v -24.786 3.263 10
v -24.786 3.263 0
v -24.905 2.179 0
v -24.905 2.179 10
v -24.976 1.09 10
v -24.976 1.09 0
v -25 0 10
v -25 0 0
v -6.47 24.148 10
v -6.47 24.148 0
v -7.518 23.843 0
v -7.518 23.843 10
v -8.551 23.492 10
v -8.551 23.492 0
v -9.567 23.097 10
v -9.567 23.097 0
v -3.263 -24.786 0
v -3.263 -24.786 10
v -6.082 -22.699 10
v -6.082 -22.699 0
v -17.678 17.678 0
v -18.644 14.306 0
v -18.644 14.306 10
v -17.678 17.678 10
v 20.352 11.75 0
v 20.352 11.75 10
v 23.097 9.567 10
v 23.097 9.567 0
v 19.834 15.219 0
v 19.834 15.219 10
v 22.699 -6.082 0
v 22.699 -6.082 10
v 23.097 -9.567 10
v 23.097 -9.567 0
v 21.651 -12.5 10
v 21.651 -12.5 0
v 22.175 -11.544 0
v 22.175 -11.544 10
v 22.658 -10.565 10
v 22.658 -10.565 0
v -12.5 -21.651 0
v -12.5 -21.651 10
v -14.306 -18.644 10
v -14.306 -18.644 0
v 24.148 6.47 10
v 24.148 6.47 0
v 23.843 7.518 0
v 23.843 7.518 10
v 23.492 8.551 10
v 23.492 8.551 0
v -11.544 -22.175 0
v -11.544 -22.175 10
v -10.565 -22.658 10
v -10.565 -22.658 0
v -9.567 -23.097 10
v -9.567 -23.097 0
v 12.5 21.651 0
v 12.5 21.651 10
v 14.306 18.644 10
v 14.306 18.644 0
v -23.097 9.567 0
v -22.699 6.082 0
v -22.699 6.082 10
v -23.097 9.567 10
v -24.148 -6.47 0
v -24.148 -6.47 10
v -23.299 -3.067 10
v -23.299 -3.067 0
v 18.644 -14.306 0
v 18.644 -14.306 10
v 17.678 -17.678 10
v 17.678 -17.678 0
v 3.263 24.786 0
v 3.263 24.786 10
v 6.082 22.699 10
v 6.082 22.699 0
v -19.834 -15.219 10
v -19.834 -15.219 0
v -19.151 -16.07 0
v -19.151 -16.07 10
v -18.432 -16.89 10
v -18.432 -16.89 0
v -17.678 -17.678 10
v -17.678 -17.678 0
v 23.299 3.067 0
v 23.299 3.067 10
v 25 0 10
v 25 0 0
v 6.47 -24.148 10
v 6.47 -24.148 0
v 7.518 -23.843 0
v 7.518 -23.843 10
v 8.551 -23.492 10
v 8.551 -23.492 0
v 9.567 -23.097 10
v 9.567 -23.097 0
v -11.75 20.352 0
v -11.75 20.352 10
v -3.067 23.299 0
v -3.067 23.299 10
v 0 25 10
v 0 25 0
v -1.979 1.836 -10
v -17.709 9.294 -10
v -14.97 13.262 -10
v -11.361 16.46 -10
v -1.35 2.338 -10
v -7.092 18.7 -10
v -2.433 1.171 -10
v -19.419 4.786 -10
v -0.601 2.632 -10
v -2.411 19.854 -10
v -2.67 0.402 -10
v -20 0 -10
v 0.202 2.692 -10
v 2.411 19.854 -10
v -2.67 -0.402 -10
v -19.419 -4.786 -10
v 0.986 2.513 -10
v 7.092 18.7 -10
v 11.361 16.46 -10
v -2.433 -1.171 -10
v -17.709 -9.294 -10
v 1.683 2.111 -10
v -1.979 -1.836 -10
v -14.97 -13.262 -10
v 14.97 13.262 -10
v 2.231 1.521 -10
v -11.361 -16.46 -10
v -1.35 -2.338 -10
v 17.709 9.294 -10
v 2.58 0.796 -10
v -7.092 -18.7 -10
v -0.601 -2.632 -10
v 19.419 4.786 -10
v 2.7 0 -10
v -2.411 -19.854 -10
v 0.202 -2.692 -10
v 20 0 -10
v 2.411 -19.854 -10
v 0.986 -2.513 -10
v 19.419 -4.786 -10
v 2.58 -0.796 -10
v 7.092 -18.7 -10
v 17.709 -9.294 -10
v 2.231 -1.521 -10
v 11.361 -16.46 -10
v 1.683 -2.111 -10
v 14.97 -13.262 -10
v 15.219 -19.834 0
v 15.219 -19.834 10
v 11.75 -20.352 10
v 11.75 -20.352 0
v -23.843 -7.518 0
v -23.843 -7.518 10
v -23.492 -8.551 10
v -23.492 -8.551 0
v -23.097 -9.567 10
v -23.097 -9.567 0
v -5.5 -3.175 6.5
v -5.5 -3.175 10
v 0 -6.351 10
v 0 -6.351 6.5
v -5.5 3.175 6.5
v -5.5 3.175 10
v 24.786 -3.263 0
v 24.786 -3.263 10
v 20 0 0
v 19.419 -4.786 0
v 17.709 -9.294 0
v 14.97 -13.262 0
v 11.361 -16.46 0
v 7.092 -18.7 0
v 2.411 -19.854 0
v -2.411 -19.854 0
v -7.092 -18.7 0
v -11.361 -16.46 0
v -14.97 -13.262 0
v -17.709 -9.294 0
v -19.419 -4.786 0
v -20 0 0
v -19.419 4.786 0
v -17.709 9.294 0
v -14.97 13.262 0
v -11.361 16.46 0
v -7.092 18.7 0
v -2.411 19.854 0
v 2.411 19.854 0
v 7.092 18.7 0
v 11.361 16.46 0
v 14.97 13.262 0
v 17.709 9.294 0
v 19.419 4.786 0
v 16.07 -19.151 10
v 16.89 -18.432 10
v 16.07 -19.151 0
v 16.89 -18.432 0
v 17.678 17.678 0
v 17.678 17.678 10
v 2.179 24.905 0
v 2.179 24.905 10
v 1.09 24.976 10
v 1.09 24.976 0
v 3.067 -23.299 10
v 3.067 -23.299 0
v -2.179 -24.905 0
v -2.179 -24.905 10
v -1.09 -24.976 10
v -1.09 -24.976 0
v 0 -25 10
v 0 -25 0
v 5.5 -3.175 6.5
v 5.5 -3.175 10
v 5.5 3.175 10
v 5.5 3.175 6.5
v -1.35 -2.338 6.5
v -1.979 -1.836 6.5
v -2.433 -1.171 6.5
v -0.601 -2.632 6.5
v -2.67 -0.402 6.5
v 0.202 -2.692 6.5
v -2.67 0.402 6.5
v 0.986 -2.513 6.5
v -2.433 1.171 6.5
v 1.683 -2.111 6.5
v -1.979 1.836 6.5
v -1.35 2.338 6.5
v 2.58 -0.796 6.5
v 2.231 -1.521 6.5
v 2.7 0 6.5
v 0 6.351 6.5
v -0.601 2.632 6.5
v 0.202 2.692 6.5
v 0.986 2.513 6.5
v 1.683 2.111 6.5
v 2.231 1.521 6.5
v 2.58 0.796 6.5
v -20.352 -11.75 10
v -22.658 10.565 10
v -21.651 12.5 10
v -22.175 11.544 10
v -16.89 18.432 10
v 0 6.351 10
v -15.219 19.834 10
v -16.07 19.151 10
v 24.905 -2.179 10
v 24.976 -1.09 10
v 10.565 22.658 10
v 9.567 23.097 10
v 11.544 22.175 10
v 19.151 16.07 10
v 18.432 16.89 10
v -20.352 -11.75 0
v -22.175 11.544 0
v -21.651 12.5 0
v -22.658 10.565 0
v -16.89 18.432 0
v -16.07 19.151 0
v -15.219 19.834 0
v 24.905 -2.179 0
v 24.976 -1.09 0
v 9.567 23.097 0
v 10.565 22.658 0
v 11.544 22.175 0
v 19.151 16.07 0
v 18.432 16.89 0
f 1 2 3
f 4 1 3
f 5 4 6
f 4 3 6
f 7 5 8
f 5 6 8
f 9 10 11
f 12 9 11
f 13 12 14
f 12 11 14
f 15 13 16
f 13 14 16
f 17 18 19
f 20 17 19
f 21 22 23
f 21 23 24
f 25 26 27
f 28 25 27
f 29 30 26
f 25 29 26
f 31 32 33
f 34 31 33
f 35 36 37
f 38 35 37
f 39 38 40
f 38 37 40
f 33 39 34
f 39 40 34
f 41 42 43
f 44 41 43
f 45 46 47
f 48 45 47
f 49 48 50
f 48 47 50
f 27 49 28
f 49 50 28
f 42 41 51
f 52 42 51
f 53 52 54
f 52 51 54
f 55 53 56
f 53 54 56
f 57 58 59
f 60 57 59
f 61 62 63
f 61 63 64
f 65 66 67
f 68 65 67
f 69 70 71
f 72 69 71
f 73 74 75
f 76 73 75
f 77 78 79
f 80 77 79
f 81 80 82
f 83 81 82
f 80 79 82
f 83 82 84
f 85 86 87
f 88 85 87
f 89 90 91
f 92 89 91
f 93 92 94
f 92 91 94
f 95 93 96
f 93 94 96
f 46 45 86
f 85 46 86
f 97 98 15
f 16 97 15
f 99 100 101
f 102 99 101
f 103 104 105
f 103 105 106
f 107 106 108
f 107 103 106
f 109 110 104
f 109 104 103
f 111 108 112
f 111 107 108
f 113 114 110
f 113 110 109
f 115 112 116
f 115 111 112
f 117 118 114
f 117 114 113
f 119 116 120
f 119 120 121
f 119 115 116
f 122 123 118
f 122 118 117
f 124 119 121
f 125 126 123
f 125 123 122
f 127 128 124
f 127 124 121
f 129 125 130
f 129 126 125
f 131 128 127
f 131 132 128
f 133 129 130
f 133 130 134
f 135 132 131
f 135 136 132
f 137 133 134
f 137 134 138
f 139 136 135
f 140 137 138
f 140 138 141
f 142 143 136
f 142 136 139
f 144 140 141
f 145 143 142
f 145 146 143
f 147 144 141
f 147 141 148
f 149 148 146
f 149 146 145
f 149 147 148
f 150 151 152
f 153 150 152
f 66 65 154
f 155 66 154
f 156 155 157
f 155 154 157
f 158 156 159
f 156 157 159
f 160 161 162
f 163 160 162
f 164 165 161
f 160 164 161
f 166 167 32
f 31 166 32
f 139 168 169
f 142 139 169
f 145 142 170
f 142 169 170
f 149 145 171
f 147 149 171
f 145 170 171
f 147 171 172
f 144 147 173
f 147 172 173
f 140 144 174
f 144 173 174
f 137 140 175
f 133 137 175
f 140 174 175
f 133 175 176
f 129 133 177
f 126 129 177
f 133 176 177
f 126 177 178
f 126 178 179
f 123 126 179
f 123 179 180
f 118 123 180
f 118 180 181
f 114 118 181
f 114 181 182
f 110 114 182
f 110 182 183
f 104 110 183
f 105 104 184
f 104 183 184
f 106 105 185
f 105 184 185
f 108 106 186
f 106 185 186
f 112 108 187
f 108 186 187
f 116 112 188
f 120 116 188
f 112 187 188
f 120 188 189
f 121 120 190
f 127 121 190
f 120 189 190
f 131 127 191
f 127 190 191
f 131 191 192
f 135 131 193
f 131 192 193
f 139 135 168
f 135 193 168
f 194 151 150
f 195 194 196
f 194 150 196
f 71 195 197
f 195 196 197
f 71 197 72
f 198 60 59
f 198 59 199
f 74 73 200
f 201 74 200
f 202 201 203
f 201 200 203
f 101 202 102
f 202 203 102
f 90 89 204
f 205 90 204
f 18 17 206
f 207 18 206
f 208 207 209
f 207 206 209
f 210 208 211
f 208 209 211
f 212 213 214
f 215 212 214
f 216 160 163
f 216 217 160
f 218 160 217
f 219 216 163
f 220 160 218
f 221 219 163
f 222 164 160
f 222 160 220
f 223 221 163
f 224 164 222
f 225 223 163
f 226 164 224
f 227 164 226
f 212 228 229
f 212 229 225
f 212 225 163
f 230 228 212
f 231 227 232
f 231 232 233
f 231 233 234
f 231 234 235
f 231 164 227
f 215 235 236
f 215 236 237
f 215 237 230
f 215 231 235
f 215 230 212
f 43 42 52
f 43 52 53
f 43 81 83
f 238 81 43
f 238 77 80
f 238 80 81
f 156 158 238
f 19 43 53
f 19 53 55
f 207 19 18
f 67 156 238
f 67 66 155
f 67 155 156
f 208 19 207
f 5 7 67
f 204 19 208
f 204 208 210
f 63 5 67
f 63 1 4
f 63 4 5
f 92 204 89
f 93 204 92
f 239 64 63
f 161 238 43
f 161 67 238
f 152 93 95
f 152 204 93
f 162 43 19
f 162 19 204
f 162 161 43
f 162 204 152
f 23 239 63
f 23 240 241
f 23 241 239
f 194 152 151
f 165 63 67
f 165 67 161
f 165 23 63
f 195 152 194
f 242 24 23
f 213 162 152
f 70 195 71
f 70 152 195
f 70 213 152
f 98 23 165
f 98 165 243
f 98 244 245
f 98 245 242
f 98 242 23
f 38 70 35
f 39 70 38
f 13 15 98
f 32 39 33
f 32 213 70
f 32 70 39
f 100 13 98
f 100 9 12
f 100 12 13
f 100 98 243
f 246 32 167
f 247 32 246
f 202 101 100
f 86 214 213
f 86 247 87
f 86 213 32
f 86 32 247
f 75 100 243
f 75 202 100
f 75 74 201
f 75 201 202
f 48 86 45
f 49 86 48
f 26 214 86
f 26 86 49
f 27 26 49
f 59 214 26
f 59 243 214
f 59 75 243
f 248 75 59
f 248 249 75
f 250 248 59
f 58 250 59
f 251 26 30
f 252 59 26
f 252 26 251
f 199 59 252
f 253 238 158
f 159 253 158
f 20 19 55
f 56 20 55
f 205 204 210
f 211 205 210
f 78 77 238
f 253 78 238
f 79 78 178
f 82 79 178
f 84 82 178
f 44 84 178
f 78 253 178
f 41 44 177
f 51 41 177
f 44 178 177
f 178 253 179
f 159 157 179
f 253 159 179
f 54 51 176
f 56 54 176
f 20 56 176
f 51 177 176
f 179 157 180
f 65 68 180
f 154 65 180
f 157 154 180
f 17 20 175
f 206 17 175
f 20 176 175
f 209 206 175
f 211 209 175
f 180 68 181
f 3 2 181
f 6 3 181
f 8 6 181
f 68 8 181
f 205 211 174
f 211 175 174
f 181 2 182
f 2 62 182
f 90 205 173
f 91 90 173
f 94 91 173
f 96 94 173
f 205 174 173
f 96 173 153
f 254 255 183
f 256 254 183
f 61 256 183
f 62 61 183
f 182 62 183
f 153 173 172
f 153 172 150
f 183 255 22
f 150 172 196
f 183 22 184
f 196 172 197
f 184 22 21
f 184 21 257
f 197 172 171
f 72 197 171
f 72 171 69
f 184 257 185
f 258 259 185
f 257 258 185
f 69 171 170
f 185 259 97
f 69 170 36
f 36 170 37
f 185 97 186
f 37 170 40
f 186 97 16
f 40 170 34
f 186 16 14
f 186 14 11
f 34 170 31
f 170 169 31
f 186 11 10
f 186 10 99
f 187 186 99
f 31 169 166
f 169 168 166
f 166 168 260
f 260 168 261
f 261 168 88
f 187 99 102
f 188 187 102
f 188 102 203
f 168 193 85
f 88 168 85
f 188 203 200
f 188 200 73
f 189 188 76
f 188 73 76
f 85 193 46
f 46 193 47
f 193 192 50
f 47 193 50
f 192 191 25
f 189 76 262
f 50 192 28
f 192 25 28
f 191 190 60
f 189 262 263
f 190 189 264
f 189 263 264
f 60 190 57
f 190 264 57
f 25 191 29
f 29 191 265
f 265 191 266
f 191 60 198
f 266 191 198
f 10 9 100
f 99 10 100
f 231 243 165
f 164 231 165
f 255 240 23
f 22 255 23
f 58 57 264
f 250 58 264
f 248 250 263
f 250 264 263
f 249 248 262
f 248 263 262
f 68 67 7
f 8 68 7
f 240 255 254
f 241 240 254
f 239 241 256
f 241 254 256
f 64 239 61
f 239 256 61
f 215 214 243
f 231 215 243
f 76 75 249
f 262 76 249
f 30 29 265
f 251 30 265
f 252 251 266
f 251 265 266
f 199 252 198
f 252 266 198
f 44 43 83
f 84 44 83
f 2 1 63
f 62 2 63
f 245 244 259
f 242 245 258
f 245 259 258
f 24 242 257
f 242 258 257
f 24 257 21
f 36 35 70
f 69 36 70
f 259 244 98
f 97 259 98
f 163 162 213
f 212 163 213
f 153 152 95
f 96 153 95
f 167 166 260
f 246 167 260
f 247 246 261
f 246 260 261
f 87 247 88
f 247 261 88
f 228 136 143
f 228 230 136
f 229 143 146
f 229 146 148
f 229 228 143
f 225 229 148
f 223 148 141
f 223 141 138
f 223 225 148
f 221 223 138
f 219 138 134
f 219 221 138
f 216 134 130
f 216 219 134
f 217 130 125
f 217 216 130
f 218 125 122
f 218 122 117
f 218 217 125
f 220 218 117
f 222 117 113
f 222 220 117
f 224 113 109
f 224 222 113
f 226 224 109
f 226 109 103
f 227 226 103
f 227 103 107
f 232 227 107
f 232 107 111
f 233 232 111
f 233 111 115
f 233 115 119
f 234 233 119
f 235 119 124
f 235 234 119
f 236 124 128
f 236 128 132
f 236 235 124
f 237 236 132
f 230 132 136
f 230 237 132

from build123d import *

# Parameters (mm, degrees)
SKETCH_R           = 25
SKETCH_R_2         = 2.7
PAD_DEPTH          = 10
POCKET_DEPTH       = 3.5
POCKET001_DEPTH    = 152.829569
POLARPATTERN_COUNT = 16
SKETCH003_R        = 20
SKETCH003_R_2      = 2.7
PAD001_DEPTH       = 10


with BuildPart() as part:
    # Sketch → Pad (new body)
    with BuildSketch(Plane.XY):
        Circle(SKETCH_R)
        Circle(SKETCH_R_2, mode=Mode.SUBTRACT)
    extrude(amount=PAD_DEPTH)

    # Sketch001 (on DatumPlane) → Pocket (cut)
    with BuildSketch(Plane.XY.offset(10)):
        Polygon((5.5, -3.175426), (5.5, 3.175426), (0, 6.350853), (-5.5, 3.175426), (-5.5, -3.175426), (0, -6.350853), align=None)
    extrude(amount=-POCKET_DEPTH, mode=Mode.SUBTRACT)

    # Sketch002 (on DatumPlane) → Pocket001 (cut, through all)
    with BuildSketch(Plane.XY.offset(10)):
        with BuildLine():
            Line((24.148146, 6.470476), (23.298954, 3.067366))
            Line((23.298954, 3.067366), (25, 0))
            ThreePointArc((25, 0), (26.776409, 3.525181), (24.148146, 6.470476))
        make_face()
    pocket001 = extrude(amount=-POCKET001_DEPTH, mode=Mode.SUBTRACT)

    # PolarPattern: Pocket001 ×16 about axis
    polarpattern_axis = Axis((0, 0, 10), (0, 0, 1))
    for i in range(1, POLARPATTERN_COUNT):
        add(pocket001.rotate(polarpattern_axis, i * 360 / POLARPATTERN_COUNT), mode=Mode.SUBTRACT)

    # Sketch003 (on Face5 of PolarPattern) → Pad001 (join)
    with BuildSketch(Plane(origin=(0, 0, 0), x_dir=(1, 0, 0), z_dir=(0, 0, -1))):
        Circle(SKETCH003_R)
        Circle(SKETCH003_R_2, mode=Mode.SUBTRACT)
    extrude(amount=PAD001_DEPTH)


solid = part.part
